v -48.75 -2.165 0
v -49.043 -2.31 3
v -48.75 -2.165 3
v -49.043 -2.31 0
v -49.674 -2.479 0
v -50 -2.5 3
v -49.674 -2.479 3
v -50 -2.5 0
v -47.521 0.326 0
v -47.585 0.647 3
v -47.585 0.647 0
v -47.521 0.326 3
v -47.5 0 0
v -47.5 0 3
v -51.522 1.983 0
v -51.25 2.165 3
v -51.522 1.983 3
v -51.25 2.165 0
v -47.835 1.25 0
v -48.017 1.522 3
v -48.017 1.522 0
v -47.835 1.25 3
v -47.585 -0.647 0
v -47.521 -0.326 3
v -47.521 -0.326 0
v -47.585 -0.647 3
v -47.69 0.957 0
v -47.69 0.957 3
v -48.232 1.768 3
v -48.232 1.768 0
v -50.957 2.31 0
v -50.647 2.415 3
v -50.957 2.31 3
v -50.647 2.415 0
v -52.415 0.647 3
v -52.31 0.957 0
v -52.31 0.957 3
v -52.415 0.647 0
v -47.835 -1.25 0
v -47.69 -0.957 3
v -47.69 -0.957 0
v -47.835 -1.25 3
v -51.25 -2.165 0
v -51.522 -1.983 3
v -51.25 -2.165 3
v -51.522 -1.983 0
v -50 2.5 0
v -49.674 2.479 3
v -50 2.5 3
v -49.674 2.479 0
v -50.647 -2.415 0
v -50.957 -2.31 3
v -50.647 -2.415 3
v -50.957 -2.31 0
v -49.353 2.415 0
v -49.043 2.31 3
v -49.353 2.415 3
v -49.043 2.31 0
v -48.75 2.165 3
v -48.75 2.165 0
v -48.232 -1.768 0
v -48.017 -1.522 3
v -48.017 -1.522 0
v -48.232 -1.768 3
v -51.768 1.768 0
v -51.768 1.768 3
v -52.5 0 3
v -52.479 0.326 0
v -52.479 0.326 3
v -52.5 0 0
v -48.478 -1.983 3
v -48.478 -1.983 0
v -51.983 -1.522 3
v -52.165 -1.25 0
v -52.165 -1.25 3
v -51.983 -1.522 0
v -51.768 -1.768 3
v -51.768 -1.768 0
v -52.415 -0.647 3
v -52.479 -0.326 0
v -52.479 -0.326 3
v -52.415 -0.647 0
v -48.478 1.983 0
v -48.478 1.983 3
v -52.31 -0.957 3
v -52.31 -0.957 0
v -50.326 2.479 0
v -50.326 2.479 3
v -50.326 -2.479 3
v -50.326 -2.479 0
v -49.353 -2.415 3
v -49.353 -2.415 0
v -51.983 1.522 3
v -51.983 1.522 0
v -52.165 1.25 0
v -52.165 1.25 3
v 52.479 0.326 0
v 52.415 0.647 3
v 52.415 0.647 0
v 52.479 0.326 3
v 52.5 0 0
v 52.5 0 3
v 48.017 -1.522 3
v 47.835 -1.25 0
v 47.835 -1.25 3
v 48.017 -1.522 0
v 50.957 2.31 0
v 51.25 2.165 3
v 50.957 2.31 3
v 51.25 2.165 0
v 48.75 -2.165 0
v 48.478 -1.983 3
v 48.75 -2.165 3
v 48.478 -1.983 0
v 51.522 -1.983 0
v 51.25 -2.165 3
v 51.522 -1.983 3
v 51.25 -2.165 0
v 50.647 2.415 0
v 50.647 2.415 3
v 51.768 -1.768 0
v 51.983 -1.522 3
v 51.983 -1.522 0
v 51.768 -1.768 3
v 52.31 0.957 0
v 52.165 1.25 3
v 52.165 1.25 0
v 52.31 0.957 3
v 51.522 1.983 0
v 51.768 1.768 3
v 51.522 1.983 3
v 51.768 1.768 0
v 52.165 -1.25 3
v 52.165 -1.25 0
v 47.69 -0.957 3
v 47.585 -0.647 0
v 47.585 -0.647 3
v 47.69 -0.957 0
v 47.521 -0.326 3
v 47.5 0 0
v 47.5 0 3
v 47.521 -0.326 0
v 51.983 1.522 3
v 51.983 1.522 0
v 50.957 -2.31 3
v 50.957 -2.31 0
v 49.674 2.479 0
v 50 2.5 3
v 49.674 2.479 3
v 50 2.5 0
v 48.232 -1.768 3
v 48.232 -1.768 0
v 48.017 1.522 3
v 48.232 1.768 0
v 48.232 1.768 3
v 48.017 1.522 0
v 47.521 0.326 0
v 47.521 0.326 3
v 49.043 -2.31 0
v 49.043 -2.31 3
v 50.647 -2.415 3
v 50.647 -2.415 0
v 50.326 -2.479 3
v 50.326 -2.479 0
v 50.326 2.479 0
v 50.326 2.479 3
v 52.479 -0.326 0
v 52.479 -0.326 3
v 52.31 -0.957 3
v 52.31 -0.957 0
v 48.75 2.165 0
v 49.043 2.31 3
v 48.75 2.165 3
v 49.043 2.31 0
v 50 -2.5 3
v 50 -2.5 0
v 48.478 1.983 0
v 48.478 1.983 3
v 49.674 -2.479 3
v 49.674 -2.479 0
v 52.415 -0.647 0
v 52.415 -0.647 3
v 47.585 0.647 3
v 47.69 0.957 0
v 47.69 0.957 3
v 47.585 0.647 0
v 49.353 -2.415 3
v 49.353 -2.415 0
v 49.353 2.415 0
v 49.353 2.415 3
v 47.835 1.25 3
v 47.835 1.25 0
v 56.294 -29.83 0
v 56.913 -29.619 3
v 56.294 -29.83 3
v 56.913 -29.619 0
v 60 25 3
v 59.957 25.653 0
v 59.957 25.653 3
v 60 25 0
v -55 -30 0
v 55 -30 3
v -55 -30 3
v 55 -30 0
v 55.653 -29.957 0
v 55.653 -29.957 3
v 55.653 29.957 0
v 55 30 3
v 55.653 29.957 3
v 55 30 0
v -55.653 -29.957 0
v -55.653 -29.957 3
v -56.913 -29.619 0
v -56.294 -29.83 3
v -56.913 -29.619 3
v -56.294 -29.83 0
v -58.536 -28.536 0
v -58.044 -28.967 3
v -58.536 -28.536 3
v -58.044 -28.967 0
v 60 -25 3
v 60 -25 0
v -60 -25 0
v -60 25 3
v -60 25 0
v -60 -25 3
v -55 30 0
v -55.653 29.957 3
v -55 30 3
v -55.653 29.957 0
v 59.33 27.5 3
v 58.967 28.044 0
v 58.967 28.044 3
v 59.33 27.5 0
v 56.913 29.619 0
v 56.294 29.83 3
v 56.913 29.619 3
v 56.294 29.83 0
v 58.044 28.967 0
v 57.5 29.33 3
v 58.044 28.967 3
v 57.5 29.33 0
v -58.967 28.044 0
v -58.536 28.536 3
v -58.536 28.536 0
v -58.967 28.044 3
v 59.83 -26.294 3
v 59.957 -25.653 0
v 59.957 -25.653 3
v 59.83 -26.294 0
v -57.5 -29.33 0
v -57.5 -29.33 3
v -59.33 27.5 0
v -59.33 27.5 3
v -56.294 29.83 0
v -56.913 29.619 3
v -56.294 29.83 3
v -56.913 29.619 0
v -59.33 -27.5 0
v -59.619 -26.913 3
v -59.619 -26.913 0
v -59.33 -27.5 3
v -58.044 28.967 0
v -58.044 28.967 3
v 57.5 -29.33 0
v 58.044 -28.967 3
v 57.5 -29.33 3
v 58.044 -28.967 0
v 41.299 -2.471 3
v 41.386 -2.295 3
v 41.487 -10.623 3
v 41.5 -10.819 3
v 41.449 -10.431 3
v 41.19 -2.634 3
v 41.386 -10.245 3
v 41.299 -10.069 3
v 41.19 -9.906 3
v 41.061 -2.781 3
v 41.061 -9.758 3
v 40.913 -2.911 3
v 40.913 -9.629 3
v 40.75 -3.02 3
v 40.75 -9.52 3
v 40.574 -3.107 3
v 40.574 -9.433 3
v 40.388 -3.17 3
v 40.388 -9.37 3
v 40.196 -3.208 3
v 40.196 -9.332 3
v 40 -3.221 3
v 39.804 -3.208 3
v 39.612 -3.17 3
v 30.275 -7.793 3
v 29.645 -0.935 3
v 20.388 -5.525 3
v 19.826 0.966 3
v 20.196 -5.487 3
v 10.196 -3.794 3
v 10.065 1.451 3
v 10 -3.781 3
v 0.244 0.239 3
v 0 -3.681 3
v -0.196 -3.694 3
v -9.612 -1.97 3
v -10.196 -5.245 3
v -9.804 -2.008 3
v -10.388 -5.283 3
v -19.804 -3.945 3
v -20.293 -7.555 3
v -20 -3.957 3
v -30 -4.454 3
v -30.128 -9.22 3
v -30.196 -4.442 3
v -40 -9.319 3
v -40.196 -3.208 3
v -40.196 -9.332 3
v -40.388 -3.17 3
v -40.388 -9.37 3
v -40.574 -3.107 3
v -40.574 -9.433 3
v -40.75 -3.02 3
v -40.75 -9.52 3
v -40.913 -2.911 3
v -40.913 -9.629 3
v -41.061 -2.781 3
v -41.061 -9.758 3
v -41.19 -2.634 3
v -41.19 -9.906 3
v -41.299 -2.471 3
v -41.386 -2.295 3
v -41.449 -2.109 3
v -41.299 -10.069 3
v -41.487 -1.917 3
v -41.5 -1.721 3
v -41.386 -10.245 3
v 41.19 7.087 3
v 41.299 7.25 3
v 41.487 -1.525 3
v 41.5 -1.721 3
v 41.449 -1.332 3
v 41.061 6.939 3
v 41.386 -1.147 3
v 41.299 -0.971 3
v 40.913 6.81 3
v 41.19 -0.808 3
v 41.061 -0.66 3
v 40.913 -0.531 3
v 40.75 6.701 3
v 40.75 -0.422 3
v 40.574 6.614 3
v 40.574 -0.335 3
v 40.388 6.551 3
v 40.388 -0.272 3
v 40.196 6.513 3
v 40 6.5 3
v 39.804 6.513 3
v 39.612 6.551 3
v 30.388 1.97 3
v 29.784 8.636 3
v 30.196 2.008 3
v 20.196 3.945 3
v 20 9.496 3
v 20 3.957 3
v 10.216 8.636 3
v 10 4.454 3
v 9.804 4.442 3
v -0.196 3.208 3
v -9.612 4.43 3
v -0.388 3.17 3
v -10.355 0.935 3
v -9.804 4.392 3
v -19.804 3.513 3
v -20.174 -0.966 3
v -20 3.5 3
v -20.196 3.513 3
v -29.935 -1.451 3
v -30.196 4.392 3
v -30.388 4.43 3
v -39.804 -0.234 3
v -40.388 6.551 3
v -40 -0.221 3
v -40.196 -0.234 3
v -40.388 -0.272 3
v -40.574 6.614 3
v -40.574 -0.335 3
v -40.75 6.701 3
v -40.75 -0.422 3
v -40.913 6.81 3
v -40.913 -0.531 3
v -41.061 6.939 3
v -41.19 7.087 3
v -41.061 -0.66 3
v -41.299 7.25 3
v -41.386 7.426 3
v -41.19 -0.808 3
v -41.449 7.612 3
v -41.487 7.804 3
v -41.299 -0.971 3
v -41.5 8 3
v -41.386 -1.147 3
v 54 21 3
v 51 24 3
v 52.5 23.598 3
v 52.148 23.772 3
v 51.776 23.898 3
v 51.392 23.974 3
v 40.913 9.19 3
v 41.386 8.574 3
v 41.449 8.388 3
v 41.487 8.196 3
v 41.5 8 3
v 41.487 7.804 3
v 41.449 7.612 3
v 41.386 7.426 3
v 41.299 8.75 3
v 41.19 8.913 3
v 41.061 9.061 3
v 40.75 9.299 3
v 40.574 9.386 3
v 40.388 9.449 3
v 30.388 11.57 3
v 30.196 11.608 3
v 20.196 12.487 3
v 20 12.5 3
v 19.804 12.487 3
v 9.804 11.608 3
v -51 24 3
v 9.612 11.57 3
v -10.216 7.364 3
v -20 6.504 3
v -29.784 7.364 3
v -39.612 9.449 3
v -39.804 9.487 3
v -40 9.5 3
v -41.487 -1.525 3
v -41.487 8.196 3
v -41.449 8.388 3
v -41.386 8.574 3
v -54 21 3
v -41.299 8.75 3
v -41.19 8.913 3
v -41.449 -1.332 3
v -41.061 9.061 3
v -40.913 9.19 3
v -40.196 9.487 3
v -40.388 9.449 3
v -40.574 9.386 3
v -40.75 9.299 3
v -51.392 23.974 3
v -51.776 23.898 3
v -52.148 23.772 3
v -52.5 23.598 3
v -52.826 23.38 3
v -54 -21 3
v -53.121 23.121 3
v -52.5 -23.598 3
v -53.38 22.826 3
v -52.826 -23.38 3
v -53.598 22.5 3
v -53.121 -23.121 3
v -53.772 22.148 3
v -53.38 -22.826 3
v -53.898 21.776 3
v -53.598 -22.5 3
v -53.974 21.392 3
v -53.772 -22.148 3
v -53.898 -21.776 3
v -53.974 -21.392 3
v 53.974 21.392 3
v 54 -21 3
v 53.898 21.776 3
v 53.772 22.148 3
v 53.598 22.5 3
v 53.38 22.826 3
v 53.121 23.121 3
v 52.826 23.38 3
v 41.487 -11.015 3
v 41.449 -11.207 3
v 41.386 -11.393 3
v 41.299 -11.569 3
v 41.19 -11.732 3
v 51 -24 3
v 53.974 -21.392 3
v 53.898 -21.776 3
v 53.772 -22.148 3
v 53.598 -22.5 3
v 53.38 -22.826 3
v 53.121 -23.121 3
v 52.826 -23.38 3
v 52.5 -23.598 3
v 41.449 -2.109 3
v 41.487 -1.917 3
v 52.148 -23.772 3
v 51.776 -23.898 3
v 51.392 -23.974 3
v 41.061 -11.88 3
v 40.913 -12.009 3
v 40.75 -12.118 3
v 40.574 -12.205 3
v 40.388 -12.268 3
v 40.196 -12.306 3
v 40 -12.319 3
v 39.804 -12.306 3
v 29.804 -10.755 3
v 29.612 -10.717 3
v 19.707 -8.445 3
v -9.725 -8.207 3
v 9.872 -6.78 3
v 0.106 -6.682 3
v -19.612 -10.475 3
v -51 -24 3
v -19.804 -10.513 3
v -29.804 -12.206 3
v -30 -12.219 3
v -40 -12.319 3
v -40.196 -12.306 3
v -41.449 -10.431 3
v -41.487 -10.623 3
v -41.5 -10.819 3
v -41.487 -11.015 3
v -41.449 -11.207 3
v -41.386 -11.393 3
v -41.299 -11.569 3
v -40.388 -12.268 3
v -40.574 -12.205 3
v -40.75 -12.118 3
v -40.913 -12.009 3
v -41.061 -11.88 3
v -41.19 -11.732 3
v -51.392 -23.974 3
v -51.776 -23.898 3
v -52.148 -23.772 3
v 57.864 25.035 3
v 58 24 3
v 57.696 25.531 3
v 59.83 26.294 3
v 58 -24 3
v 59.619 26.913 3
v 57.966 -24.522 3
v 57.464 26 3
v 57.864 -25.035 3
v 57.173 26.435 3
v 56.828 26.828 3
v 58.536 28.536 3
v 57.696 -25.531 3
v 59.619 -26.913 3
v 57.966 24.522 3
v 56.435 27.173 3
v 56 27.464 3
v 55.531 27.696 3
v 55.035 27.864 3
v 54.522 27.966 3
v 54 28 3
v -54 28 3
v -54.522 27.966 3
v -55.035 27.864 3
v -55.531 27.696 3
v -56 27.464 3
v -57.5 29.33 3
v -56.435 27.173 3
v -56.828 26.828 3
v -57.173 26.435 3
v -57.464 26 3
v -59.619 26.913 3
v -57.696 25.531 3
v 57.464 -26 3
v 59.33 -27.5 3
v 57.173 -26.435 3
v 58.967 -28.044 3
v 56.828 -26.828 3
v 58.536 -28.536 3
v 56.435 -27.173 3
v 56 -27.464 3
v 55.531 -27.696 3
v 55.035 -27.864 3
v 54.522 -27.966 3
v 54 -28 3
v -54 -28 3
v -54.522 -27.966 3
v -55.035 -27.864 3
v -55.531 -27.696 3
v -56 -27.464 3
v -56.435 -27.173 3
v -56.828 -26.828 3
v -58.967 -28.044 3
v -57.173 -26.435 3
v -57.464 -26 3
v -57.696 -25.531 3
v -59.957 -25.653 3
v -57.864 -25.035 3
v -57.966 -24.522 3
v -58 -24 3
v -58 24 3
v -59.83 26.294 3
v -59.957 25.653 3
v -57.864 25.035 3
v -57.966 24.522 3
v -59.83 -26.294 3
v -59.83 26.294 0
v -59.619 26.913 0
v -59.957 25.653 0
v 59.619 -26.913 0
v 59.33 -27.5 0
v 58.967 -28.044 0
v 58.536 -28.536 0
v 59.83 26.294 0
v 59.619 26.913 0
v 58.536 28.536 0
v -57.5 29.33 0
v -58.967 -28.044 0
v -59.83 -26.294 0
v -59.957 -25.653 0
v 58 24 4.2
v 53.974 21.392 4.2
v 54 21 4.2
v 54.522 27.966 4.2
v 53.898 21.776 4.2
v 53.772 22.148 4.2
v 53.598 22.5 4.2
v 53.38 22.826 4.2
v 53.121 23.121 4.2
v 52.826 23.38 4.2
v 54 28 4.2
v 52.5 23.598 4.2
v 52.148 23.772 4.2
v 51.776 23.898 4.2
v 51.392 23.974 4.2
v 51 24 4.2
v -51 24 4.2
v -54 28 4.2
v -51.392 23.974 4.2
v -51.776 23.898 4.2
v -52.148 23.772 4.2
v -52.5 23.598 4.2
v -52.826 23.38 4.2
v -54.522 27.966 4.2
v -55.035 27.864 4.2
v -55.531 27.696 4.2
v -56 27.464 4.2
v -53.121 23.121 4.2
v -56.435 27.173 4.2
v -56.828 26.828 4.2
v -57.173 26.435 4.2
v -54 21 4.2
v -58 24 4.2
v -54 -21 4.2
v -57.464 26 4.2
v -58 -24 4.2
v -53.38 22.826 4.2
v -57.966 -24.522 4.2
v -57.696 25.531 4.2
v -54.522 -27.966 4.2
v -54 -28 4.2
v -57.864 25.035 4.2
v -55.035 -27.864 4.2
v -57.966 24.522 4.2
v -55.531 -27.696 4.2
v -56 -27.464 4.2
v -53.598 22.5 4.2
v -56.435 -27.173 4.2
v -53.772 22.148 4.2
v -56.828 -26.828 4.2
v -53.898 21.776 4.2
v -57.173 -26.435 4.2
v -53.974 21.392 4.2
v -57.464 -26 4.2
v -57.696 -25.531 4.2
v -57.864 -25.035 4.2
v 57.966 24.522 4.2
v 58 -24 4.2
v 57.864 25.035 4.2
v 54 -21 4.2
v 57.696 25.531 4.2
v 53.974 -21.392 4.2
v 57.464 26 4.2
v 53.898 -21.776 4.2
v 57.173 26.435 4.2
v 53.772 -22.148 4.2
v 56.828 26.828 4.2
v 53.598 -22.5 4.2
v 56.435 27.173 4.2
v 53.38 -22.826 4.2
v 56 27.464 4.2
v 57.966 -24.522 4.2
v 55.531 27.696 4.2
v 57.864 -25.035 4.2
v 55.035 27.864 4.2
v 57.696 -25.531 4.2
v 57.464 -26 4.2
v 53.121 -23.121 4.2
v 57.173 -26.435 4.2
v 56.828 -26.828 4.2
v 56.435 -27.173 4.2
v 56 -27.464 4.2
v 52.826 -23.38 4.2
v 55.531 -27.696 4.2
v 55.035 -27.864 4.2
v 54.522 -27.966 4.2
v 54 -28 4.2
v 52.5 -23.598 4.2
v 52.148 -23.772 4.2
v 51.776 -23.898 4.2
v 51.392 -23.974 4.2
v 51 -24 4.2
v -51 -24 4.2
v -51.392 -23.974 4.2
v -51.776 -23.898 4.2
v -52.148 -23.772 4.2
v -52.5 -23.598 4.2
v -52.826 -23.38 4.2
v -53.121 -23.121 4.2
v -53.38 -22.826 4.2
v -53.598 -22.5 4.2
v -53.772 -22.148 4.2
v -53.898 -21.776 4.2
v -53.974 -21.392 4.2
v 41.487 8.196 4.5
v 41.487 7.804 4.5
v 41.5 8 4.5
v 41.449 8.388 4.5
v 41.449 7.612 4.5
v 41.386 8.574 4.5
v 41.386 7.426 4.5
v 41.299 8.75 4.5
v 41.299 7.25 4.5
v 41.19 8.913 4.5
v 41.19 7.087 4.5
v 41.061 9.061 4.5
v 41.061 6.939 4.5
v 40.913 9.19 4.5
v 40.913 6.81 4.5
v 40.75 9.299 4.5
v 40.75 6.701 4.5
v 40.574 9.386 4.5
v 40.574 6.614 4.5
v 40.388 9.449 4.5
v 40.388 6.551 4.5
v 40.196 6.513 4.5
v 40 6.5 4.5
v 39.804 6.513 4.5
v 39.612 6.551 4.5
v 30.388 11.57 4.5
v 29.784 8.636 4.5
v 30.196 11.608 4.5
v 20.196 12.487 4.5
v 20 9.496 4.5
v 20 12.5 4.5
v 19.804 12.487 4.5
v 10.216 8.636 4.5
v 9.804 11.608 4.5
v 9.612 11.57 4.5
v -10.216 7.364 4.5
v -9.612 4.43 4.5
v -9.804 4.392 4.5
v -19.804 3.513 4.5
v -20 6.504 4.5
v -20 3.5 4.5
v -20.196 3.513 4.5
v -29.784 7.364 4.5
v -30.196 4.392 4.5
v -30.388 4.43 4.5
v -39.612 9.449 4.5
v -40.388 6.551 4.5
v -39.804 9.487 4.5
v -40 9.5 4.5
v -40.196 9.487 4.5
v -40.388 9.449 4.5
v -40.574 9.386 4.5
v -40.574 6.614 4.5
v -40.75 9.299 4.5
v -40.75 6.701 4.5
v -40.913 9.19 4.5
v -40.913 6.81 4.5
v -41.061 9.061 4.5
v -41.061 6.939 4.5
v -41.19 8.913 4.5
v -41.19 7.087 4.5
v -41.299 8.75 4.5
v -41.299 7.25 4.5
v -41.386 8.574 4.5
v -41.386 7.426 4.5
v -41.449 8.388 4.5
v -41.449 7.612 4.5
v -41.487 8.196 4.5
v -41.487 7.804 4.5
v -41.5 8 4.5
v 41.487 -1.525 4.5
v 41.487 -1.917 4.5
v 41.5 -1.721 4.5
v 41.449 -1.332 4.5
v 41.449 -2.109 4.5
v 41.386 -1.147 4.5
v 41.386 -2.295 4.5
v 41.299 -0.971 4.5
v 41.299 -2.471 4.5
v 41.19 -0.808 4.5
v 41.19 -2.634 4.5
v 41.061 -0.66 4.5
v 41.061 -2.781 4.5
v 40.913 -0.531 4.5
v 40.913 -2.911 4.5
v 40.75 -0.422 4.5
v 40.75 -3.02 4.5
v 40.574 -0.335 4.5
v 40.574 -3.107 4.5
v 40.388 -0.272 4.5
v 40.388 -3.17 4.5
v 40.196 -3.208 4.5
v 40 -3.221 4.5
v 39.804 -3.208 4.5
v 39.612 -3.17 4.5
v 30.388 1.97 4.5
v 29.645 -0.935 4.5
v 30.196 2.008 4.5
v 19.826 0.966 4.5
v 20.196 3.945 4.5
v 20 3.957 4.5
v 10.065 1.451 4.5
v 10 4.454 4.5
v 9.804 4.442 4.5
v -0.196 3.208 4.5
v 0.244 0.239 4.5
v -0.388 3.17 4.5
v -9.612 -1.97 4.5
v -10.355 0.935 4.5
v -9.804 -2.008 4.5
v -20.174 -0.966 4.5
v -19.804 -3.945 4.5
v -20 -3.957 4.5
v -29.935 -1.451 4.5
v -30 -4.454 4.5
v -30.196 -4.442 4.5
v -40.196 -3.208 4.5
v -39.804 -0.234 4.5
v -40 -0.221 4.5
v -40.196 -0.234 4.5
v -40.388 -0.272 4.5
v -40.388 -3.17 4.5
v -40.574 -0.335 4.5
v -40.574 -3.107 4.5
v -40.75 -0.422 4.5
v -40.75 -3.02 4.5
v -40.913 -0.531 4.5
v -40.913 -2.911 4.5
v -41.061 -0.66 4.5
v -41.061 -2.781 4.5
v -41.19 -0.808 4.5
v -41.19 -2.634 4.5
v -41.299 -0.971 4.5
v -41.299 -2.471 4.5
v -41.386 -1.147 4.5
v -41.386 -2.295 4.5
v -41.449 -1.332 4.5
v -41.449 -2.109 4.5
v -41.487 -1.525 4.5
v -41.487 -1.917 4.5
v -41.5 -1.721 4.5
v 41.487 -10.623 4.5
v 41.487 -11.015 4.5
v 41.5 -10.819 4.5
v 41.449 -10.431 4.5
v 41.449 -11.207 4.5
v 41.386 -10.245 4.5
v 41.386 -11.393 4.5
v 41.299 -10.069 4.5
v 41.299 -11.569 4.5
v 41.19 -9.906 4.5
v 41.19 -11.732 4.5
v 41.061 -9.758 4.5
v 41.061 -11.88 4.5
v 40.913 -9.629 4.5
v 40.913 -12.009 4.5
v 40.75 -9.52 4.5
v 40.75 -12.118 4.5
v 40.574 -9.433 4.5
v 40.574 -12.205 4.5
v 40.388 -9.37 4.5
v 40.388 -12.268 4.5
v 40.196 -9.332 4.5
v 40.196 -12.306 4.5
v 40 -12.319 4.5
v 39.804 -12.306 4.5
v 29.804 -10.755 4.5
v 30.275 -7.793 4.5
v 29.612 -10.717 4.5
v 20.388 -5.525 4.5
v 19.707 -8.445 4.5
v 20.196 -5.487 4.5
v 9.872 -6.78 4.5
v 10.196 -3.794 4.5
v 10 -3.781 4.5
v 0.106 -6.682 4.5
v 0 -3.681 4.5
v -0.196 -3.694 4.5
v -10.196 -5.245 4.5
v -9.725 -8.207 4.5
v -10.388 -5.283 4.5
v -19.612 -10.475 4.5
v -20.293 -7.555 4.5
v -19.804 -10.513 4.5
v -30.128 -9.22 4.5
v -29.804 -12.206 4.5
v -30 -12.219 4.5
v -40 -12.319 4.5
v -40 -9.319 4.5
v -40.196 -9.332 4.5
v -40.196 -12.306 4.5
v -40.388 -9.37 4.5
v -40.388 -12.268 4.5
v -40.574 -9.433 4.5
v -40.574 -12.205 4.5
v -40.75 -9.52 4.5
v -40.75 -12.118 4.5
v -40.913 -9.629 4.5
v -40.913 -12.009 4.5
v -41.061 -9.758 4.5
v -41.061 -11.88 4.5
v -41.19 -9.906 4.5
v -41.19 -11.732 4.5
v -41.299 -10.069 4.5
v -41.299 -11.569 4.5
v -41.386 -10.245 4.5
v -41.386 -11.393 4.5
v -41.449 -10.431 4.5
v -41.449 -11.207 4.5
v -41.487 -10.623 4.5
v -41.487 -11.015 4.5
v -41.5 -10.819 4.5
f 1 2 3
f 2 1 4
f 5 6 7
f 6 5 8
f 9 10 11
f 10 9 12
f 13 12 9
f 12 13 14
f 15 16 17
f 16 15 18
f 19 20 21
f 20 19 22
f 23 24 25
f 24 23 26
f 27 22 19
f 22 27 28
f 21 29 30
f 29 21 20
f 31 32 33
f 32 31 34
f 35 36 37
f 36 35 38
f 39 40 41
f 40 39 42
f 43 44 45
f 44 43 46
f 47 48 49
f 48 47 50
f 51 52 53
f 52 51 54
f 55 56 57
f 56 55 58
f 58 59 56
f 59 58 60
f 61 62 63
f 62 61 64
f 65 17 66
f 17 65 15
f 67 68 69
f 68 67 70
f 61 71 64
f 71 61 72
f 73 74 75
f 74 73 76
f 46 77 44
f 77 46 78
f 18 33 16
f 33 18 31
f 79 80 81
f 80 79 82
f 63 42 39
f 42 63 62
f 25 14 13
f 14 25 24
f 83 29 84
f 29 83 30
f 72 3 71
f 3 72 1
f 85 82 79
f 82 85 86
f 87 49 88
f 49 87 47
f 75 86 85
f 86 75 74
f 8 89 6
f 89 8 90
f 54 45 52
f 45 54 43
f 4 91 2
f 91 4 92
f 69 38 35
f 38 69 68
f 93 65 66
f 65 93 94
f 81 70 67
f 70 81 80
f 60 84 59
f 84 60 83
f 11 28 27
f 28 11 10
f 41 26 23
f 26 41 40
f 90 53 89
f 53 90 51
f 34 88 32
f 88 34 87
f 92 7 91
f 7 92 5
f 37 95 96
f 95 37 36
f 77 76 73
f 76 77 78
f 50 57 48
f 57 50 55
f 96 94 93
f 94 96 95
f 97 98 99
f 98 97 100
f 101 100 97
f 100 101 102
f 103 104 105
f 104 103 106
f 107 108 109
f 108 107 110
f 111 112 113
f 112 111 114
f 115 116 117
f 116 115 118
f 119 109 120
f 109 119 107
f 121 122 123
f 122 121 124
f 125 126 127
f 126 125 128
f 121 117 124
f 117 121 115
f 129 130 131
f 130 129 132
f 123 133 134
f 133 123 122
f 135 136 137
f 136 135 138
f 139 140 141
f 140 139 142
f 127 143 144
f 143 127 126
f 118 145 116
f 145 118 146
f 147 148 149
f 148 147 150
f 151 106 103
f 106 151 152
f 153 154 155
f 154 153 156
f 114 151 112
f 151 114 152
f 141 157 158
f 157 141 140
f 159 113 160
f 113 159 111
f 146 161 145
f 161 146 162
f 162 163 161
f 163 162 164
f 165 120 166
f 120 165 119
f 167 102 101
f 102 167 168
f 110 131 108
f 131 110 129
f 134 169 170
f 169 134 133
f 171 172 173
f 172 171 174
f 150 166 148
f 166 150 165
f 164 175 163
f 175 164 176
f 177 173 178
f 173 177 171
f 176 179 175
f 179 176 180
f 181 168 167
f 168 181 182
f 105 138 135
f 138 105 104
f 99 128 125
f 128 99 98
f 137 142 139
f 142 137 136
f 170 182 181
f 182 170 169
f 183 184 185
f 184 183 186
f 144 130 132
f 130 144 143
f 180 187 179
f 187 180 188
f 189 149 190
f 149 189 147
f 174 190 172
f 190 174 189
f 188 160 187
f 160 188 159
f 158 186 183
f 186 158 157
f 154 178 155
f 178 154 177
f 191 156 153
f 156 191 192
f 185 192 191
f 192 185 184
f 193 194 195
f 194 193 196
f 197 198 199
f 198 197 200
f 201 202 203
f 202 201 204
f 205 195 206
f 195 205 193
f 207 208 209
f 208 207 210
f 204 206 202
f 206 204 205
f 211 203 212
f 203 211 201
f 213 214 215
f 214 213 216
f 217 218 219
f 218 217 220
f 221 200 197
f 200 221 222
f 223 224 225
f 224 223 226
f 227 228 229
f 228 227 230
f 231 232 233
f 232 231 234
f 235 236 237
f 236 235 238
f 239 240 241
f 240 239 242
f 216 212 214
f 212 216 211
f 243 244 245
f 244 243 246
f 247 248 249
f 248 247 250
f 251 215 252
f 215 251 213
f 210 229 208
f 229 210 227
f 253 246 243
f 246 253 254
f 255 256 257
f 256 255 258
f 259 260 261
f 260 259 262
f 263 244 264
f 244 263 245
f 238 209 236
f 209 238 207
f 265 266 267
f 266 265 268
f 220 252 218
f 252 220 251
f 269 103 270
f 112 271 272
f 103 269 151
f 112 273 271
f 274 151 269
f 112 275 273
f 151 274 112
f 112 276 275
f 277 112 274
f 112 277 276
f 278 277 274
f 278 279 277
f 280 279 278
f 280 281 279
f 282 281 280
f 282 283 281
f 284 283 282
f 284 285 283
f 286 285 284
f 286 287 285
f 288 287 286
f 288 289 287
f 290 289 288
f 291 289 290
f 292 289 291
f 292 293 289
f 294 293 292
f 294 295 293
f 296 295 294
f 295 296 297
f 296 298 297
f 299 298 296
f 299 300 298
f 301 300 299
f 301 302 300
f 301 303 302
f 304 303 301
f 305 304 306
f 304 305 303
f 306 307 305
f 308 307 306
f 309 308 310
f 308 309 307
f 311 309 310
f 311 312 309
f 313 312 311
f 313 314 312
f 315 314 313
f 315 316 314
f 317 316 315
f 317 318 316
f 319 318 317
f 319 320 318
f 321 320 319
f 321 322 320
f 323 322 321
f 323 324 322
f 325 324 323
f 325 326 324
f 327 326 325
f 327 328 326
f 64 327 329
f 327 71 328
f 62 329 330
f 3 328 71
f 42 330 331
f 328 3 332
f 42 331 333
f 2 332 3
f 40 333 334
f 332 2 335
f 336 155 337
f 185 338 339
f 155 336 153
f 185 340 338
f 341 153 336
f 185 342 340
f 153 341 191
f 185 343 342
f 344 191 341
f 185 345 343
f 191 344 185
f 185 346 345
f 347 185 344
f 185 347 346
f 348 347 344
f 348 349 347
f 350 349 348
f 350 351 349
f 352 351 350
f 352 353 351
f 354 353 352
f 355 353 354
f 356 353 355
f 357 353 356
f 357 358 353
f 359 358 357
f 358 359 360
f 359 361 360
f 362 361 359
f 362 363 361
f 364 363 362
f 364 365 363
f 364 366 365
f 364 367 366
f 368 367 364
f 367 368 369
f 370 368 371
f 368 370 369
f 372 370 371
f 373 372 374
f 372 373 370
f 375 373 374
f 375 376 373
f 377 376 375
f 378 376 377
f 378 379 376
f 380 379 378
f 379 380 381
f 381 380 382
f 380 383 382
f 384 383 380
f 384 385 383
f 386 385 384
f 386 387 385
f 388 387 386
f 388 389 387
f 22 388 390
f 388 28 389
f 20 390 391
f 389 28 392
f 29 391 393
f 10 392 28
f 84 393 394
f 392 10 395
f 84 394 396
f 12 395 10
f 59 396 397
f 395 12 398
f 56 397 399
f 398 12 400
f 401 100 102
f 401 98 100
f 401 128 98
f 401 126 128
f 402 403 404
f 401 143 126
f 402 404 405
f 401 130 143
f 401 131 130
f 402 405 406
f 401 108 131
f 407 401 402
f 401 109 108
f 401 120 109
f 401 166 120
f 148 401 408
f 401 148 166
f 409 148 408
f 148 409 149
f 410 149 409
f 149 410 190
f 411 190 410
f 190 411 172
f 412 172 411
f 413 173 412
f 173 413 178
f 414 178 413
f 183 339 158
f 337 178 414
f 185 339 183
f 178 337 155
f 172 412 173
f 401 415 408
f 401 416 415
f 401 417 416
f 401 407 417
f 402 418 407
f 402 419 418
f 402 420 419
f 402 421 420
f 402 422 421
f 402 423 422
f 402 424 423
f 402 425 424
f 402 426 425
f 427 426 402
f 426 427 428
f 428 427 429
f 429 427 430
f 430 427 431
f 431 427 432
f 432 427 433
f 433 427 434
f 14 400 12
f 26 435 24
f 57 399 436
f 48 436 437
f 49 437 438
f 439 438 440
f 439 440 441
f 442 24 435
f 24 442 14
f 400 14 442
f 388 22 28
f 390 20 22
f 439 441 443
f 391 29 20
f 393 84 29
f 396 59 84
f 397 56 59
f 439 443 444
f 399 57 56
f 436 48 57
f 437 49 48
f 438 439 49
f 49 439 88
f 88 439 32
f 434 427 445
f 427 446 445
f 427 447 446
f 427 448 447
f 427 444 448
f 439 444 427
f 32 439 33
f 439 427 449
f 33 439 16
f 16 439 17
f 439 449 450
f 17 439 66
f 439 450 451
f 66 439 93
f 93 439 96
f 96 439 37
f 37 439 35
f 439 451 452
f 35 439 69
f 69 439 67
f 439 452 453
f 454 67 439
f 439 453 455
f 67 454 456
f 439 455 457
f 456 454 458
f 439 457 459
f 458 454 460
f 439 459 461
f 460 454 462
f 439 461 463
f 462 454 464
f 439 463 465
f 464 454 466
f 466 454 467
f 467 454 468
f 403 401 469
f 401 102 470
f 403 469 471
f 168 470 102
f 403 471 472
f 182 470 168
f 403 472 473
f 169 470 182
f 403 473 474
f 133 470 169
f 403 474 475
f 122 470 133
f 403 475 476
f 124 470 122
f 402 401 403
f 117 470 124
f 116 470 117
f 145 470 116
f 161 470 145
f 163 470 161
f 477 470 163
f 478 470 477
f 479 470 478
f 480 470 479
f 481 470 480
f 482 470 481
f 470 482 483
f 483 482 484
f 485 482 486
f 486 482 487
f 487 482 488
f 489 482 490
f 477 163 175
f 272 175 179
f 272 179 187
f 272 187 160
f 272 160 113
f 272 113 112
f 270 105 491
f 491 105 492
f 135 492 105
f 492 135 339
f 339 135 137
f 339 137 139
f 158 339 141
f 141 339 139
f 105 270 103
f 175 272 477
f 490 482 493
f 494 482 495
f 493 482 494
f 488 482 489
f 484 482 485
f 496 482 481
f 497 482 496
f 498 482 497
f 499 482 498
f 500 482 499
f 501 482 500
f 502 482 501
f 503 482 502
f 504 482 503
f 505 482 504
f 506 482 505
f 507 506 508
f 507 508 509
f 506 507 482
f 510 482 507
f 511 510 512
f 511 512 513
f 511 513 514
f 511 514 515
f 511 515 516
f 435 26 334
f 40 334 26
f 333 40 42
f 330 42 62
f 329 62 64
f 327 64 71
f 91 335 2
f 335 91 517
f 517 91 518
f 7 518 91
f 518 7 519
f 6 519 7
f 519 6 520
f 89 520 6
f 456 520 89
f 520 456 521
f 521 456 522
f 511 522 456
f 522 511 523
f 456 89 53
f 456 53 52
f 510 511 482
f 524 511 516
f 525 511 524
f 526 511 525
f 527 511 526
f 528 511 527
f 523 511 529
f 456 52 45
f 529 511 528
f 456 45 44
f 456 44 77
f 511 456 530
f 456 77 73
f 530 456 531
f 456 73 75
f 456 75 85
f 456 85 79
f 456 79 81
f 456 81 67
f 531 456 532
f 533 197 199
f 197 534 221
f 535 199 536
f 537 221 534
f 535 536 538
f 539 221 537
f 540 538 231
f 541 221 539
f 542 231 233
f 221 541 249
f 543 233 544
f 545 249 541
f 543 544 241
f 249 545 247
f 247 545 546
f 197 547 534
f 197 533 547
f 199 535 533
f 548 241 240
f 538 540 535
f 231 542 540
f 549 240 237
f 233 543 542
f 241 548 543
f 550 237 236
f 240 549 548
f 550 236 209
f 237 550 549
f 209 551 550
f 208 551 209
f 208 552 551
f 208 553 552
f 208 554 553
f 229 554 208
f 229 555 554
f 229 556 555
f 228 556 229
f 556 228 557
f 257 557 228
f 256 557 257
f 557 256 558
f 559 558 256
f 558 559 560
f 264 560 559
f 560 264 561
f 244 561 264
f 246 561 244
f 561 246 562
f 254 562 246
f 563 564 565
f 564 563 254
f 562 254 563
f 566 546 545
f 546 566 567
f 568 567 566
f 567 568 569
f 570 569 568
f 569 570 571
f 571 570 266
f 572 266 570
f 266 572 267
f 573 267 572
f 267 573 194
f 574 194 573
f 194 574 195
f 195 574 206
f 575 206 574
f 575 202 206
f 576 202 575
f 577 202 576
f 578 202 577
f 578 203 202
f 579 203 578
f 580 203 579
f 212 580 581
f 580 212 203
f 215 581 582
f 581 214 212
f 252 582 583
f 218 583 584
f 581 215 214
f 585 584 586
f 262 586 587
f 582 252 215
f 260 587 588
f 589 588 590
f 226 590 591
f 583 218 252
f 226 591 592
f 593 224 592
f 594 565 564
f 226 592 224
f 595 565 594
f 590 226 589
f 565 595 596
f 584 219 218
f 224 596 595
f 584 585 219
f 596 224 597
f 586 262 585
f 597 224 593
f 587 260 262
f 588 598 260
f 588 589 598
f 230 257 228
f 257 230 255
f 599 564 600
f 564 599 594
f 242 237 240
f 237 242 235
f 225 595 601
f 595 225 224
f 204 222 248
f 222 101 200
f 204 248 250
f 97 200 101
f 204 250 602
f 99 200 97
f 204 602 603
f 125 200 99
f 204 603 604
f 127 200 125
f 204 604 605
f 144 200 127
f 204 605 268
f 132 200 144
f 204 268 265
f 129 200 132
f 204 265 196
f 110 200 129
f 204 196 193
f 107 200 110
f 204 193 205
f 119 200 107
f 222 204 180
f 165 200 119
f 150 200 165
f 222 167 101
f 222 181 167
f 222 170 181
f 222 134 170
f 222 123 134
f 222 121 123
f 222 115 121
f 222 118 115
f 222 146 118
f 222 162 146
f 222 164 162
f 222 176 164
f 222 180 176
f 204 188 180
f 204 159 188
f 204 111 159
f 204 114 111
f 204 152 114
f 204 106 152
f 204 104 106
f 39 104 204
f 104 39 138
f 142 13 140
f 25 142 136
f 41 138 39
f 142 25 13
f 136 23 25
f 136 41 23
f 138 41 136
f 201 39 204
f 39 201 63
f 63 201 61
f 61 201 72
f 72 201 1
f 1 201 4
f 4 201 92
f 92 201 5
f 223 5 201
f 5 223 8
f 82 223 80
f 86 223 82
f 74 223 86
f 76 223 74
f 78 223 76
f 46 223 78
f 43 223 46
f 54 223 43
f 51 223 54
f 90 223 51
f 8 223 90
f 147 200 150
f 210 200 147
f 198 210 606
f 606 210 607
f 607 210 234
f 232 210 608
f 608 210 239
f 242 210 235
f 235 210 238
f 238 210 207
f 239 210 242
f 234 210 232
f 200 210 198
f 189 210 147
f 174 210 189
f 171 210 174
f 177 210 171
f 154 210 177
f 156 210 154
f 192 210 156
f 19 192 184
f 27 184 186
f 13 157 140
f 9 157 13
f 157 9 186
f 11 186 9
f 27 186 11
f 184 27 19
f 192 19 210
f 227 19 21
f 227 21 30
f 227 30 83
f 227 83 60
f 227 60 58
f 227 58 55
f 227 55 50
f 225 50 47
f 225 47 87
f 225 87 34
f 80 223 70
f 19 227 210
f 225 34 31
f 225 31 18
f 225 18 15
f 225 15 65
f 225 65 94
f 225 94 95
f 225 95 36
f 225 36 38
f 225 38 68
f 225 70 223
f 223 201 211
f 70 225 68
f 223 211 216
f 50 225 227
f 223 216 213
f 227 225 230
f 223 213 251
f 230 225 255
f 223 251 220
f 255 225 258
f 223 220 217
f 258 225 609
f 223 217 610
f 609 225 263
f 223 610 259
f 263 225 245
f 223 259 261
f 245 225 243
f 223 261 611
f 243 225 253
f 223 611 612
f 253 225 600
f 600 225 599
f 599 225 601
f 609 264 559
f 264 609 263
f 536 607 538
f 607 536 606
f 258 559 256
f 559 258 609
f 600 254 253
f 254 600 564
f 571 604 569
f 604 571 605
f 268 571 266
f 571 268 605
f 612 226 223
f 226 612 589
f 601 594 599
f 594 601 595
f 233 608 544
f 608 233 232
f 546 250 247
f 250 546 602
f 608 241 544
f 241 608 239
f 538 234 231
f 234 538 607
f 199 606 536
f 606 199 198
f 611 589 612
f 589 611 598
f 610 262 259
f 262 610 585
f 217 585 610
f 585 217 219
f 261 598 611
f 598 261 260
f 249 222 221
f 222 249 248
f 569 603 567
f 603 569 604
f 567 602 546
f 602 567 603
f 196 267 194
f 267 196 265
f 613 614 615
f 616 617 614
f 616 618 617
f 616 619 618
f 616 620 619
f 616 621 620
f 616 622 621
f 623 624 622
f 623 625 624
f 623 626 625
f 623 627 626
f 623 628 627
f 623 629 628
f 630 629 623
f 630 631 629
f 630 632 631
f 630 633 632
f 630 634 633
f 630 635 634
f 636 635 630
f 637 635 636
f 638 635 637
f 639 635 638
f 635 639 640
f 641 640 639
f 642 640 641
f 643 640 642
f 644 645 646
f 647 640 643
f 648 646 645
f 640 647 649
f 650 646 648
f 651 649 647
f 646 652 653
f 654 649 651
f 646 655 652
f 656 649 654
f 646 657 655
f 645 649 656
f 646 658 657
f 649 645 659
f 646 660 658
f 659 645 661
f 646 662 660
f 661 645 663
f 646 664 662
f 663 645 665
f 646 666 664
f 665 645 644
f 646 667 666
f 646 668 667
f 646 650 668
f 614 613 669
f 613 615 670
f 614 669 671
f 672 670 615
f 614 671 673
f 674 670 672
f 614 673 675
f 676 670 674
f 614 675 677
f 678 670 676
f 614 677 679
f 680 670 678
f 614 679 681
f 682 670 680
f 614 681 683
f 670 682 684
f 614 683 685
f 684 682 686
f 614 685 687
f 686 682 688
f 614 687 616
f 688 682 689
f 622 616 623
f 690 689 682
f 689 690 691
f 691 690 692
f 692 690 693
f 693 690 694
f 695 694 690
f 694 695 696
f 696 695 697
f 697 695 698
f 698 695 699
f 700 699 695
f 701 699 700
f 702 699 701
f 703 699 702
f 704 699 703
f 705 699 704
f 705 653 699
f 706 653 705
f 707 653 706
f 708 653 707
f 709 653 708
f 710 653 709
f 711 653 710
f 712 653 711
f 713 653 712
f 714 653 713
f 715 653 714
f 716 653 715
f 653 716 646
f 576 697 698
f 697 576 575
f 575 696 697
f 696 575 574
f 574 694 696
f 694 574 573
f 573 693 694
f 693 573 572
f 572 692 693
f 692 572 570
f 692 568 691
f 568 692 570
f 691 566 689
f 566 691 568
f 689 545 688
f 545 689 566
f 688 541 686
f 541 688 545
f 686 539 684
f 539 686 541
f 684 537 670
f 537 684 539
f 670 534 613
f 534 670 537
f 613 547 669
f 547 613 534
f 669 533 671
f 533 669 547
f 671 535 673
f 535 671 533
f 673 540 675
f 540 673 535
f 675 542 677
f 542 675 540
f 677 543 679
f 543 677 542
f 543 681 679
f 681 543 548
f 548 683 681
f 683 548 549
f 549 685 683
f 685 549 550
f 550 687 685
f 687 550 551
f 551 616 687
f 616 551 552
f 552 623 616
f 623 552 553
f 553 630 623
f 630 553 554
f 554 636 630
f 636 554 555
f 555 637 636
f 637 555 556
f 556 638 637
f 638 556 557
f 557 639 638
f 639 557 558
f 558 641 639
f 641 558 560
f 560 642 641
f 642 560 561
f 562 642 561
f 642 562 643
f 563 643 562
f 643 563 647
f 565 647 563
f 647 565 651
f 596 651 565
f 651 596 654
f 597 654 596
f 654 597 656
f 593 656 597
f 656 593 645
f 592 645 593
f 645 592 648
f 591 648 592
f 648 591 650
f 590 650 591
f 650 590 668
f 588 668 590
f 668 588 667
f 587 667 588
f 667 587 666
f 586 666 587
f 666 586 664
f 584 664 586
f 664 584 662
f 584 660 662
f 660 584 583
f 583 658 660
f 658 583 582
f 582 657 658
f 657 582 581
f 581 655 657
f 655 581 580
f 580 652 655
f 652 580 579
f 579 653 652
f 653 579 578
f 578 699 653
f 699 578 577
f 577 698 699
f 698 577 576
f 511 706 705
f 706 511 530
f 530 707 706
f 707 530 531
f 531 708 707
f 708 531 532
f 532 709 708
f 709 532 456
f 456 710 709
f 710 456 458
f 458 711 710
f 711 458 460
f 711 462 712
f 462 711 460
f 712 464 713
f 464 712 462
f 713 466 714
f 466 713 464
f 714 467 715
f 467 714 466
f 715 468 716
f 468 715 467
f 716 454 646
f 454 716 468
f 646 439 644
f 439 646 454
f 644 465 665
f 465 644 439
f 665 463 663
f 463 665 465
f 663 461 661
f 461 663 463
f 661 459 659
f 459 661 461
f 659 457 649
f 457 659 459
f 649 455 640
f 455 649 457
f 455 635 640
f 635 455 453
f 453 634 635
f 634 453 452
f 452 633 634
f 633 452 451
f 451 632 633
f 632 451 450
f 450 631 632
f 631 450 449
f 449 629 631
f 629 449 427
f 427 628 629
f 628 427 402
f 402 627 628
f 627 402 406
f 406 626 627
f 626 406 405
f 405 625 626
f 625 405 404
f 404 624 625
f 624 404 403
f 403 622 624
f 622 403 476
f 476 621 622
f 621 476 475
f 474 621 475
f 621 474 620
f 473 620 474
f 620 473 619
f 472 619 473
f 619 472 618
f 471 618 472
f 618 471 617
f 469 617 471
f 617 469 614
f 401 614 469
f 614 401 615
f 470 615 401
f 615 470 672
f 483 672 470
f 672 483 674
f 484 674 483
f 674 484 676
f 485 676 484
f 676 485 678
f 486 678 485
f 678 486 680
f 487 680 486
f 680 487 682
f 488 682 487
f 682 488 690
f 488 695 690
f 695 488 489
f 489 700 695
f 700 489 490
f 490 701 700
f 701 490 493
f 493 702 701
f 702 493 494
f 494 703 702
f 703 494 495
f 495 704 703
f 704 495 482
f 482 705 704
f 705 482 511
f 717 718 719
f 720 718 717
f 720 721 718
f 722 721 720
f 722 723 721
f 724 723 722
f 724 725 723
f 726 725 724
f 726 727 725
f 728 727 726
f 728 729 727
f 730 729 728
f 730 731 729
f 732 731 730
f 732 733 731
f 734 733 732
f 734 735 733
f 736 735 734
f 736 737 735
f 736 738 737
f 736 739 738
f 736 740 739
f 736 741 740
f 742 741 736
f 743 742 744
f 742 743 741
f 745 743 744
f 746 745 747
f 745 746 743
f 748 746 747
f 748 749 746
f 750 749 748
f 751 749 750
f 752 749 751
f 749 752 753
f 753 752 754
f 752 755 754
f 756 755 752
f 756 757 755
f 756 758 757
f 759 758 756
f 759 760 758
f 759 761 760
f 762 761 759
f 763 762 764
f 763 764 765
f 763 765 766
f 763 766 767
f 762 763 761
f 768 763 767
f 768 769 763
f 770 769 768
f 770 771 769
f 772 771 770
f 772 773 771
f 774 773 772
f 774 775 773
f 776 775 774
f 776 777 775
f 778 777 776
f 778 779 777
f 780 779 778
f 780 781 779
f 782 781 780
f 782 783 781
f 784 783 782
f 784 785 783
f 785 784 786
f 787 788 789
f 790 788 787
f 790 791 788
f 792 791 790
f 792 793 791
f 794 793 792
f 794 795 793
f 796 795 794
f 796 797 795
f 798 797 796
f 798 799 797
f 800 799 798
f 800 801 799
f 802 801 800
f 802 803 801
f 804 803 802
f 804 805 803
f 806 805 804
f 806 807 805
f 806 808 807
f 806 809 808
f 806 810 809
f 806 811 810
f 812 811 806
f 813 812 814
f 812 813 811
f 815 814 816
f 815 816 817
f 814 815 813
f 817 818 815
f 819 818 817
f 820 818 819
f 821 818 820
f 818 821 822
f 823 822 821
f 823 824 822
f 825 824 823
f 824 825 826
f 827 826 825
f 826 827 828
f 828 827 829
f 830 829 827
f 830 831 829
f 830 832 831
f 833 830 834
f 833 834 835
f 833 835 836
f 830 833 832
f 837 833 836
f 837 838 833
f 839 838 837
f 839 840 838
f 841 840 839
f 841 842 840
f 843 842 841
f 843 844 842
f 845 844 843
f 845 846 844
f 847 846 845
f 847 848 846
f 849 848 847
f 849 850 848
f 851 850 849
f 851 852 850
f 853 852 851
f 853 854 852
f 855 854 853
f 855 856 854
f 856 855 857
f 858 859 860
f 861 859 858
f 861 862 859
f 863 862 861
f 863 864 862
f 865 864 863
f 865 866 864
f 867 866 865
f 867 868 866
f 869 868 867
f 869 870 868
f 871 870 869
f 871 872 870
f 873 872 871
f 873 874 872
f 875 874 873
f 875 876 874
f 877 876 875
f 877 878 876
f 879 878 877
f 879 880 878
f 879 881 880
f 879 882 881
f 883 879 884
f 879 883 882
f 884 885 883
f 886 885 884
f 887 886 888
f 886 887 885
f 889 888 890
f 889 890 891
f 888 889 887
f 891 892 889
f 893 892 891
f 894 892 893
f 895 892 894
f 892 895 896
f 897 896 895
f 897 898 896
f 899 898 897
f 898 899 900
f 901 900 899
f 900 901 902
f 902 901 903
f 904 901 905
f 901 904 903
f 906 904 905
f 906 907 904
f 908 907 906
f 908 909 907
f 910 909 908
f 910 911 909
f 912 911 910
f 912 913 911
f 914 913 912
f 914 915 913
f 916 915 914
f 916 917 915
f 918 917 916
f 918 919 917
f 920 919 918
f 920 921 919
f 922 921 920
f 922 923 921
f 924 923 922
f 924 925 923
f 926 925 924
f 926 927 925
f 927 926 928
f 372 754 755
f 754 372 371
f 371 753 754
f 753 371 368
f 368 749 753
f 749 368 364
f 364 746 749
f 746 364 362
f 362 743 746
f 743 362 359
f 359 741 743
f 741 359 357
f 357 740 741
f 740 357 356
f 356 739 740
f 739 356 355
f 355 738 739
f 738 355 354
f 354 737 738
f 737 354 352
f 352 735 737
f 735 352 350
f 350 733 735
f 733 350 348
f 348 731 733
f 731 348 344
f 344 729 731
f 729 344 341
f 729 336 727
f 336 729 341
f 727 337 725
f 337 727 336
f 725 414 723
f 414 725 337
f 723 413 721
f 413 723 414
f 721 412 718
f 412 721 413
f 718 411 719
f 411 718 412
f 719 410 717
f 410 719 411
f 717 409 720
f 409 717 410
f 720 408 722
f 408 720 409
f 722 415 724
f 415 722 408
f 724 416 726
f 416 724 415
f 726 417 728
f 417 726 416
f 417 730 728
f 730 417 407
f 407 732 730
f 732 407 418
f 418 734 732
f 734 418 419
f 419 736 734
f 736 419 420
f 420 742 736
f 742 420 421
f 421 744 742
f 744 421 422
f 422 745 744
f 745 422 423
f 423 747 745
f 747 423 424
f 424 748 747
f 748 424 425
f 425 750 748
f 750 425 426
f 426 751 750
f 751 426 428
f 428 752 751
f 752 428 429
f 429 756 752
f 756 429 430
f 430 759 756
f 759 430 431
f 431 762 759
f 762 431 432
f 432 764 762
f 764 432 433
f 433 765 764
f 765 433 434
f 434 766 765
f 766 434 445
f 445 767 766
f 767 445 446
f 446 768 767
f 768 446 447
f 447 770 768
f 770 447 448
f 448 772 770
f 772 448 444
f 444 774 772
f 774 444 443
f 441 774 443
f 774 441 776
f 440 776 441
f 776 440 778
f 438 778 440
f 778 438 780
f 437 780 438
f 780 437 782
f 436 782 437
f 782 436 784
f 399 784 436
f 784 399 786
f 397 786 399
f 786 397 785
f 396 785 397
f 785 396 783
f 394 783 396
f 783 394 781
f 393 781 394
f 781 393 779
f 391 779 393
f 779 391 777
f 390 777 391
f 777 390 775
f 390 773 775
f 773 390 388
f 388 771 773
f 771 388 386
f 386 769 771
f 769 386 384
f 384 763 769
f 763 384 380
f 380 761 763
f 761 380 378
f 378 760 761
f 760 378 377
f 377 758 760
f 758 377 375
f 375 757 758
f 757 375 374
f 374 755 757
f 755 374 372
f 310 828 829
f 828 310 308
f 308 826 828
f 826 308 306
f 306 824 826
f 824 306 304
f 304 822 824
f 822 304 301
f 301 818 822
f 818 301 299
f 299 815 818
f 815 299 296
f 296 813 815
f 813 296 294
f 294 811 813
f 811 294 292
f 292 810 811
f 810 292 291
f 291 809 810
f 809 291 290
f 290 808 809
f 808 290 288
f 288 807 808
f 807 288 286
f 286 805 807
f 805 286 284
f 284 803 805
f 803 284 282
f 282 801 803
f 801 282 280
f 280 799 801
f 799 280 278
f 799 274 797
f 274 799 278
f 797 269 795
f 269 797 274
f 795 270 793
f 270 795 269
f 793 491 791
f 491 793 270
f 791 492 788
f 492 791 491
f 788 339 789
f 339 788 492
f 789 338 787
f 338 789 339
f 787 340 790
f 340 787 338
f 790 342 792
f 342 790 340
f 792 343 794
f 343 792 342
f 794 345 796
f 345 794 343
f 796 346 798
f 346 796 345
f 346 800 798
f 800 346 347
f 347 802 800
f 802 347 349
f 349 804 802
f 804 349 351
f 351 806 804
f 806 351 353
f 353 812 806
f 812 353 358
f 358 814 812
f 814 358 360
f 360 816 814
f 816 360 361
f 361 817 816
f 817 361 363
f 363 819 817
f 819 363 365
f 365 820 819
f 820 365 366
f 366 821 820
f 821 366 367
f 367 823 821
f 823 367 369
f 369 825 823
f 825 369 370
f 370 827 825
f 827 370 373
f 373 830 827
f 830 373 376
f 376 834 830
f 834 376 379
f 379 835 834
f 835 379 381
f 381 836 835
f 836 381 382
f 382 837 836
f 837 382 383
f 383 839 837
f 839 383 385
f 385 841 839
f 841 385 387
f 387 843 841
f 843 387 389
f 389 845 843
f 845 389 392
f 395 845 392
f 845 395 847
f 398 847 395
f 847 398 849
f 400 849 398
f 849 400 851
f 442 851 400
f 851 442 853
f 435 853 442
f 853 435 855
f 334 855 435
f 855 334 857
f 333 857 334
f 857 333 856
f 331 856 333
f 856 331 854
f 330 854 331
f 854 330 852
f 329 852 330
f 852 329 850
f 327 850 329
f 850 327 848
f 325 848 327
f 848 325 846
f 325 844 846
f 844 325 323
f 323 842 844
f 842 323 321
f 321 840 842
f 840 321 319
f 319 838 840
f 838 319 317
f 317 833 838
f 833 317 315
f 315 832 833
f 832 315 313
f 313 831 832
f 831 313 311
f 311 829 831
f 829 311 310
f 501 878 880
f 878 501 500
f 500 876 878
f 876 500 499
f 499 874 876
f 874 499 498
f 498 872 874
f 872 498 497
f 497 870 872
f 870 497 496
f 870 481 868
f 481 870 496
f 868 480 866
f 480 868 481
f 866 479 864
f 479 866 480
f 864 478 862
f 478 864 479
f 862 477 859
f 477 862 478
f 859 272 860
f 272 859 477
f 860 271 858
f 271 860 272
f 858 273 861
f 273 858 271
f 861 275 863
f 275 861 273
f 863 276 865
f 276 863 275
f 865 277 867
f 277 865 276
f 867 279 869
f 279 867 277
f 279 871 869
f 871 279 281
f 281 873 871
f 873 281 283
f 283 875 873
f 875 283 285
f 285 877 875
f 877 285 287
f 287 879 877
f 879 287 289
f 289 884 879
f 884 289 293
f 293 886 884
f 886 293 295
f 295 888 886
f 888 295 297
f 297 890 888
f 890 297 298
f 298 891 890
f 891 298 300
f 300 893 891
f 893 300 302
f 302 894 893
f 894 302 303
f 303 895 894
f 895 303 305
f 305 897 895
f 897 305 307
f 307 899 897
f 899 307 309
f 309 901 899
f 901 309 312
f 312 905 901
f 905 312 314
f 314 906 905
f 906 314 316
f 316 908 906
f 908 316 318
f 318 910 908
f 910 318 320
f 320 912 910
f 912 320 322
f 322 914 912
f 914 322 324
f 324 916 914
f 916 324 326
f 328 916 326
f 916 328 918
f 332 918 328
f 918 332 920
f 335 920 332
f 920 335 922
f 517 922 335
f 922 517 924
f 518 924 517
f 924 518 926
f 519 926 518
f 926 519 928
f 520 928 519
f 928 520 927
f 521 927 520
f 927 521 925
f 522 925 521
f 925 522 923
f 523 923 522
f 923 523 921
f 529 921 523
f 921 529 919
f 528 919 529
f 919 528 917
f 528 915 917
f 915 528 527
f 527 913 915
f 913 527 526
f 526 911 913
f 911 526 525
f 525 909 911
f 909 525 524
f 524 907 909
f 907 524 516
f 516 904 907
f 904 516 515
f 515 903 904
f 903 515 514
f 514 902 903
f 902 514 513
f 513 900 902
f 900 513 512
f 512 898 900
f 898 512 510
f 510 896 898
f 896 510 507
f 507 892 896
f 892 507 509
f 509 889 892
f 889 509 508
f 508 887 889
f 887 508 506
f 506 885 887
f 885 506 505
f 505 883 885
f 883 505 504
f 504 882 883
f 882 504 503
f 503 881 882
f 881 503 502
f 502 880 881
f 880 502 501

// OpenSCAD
// Digital Workshop v0.7 canonical beginner-journey fixture.
// Generate with variant=0 (Primary), 1 (Alternate), or 2 (Preview Only).

$fn = 48;
variant = is_undef(variant) ? 0 : variant;

module rounded_rect(width, height, radius) {
    offset(r = radius)
        square([width - radius * 2, height - radius * 2], center = true);
}

module plaque() {
    difference() {
        linear_extrude(height = 3)
            rounded_rect(120, 60, 5);

        for (x = [-50, 50]) {
            translate([x, 0, -0.1])
                cylinder(h = 3.2, r = 2.5);
        }
    }
}

module rim_2d() {
    difference() {
        rounded_rect(116, 56, 4);
        rounded_rect(108, 48, 3);
    }
}

module wave_2d(y, phase) {
    for (i = [-4 : 3]) {
        hull() {
            translate([i * 10, y + sin(i * 45 + phase) * 3])
                circle(r = 1.5);
            translate([(i + 1) * 10, y + sin((i + 1) * 45 + phase) * 3])
                circle(r = 1.5);
        }
    }
}

module primary_relief_2d() {
    wave_2d(8, 0);
    wave_2d(0, 35);
    wave_2d(-8, 70);
}

module alternate_relief_2d() {
    polygon(points = [[-42, -14], [-25, 12], [-9, -14]]);
    polygon(points = [[-20, -14], [2, 18], [24, -14]]);
    polygon(points = [[12, -14], [31, 10], [44, -14]]);
    translate([35, 15]) circle(r = 4);
}

module preview_only_relief_2d() {
    hull() {
        translate([-12, 0]) circle(r = 8);
        translate([15, 0]) circle(r = 5);
    }
    polygon(points = [[-17, 0], [-34, 13], [-31, 0], [-34, -13]]);
    translate([10, 2]) circle(r = 1.2);
    translate([30, 11]) circle(r = 2.2);
    translate([38, 16]) circle(r = 1.5);
}

union() {
    plaque();

    translate([0, 0, 3])
        linear_extrude(height = 1.2)
            rim_2d();

    translate([0, 0, 3])
        linear_extrude(height = 1.5) {
            if (variant == 0)
                primary_relief_2d();
            else if (variant == 1)
                alternate_relief_2d();
            else
                preview_only_relief_2d();
        }
}
